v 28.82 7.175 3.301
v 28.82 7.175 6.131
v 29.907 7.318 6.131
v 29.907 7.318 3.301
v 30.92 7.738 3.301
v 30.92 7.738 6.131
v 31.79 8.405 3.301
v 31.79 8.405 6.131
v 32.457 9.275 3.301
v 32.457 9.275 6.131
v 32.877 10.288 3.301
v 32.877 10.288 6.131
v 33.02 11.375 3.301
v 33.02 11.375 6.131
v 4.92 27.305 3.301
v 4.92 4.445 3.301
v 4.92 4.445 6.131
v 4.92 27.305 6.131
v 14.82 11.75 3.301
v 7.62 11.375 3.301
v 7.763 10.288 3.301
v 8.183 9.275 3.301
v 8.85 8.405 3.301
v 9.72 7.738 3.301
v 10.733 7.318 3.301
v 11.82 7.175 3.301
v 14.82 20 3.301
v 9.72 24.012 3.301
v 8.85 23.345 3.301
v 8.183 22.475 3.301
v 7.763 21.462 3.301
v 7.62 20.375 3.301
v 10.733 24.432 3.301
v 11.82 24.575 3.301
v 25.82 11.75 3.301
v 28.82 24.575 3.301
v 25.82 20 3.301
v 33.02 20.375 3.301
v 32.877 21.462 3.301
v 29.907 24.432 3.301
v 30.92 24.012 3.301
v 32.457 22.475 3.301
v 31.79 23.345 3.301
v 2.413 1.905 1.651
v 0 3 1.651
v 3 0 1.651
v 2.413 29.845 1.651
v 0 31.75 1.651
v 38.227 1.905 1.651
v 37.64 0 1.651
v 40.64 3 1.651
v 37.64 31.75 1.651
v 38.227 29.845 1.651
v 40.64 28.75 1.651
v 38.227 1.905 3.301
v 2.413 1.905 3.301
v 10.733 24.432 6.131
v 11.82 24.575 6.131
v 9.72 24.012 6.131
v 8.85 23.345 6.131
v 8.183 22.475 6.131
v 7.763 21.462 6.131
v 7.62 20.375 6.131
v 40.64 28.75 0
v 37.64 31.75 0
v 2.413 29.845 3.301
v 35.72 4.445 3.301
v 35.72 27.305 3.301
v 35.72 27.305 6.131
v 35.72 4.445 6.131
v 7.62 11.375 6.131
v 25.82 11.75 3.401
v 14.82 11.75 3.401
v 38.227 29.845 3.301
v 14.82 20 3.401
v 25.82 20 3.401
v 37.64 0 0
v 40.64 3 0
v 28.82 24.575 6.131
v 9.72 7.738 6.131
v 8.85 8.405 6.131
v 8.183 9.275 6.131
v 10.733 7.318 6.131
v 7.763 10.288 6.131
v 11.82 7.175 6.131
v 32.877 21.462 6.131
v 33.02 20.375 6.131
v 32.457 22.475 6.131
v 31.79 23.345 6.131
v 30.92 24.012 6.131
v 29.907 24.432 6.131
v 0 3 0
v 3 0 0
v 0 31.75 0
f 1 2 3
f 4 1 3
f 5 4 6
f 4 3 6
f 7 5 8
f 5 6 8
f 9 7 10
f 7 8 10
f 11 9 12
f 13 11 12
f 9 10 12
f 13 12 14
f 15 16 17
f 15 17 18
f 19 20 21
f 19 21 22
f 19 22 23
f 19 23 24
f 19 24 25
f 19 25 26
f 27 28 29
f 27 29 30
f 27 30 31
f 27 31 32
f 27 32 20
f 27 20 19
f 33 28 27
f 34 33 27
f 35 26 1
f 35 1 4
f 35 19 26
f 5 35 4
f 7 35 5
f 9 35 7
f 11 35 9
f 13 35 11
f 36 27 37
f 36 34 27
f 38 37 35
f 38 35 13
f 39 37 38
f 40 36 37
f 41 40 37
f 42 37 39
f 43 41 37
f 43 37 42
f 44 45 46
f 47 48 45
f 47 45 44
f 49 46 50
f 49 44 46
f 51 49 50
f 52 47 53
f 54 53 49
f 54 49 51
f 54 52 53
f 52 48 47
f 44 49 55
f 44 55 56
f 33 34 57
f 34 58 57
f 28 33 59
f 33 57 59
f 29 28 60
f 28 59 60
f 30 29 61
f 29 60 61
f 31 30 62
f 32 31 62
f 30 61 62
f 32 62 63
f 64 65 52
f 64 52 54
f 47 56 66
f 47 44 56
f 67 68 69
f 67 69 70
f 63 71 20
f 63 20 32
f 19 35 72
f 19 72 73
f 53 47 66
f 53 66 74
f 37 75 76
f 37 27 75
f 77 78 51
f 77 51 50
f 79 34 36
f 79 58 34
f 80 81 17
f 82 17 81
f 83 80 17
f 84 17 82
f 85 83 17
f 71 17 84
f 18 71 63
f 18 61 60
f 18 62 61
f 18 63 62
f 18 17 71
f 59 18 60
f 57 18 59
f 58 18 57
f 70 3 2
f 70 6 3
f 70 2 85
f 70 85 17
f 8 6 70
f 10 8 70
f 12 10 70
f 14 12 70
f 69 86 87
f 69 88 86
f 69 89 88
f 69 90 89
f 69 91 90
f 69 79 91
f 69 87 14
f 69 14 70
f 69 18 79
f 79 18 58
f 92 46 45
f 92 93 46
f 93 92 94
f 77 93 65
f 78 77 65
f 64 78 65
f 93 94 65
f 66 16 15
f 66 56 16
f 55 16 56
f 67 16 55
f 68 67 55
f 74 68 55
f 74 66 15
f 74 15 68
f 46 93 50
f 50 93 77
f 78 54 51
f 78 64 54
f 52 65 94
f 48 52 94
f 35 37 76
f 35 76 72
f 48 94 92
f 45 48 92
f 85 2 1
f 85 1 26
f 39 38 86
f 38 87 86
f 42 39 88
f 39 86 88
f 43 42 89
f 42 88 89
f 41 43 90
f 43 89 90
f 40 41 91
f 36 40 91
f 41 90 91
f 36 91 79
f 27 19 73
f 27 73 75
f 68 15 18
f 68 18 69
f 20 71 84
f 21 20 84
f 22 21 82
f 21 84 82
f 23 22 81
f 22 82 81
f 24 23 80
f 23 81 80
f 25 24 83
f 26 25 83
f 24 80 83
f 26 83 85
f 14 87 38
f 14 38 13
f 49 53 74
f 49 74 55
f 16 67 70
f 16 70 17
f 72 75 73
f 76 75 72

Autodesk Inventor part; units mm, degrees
ref_plane "YZ Plane" through (0, 0, 0) normal (1, 0, 0) x (0, 1, 0)
ref_plane "XZ Plane" through (0, 0, 0) normal (0, 1, 0) x (-1, 0, 0)
ref_plane "XY Plane" through (0, 0, 0) normal (0, 0, 1) x (1, 0, 0)
sketch "Sketch1" plane through (0, 0, 0) normal (0, 0, 1) x (1, 0, 0)
  line L0 (3, 0) -> (40.64, 0)
  line L1 (37.64, 31.75) -> (0, 31.75)
  line L2 (0, 31.75) -> (0, 3)
  line L3 (37.64, 31.75) -> (40.64, 28.75)
  line L4 (3, 0) -> (0, 3)
  line L5 (40.64, 3) -> (37.64, 0)
  line L6 (40.64, 28.75) -> (40.64, 3)
  point P0 (0, 0)
  dimension "d4" = 3
  dimension "d5" = 45
  dimension "d6" = 45
  dimension "d7" = 3
  dimension "d8" = 31.75
  dimension "d9" = 40.64
  dimension "d10" = 3
extrude "Extrusion1" add sketch "Sketch1" along normal blind 1.651
sketch "Sketch2" plane through (0, 0, 1.651) normal (0, 0, 1) x (1, 0, 0)
  line L0 (2.413, 29.845) -> (38.227, 29.845)
  line L1 (38.227, 29.845) -> (38.227, 1.905)
  line L2 (38.227, 1.905) -> (2.413, 1.905)
  line L3 (2.413, 1.905) -> (2.413, 29.845)
  line L4 (0, 31.75) -> (0, 3) projected
  line L5 (3, 0) -> (37.64, 0) projected
  line L6 (40.64, 3) -> (40.64, 28.75) projected
  point P0 (0, 0)
  point P1 (0, 17.375)
  point P2 (20.32, 1.905)
  point P3 (20.32, 0)
  point P4 (38.227, 15.875)
  point P5 (40.64, 15.875)
  dimension "d13" = 27.94
  dimension "d14" = 35.814
extrude "Extrusion2" add sketch "Sketch2" along normal blind 1.65
sketch "Sketch3" plane through (0, 0, 3.301) normal (0, 0, 1) x (1, 0, 0)
  line L0 (4.92, 27.305) -> (35.72, 27.305)
  line L1 (35.72, 27.305) -> (35.72, 4.445)
  line L2 (35.72, 4.445) -> (4.92, 4.445)
  line L3 (4.92, 4.445) -> (4.92, 27.305)
  line L4 (2.413, 29.845) -> (2.413, 1.905) projected
  line L5 (3, 0) -> (37.64, 0) projected
  point P0 (0, 0)
  point P1 (4.92, 15.875)
  point P2 (2.413, 15.875)
  point P3 (20.32, 4.445)
  point P4 (20.32, 0)
  dimension "d17" = 22.86
  dimension "d18" = 30.8
extrude "Extrusion3" add sketch "Sketch3" along normal blind 2.83
sketch "Sketch4" plane through (0, 0, 6.131) normal (0, 0, 1) x (1, 0, 0)
  line L0 (11.82, 24.575) -> (28.82, 24.575)
  line L1 (33.02, 20.375) -> (33.02, 11.375)
  line L2 (28.82, 7.175) -> (11.82, 7.175)
  line L3 (7.62, 11.375) -> (7.62, 20.375)
  line L4 (4.92, 27.305) -> (4.92, 4.445) projected
  line L5 (2.413, 1.905) -> (38.227, 1.905) projected
  arc A0 (7.62, 11.375) -> (11.82, 7.175) centre (11.82, 11.375) ccw
  arc A1 (11.82, 24.575) -> (7.62, 20.375) centre (11.82, 20.375) ccw
  arc A2 (33.02, 20.375) -> (28.82, 24.575) centre (28.82, 20.375) ccw
  arc A3 (28.82, 7.175) -> (33.02, 11.375) centre (28.82, 11.375) ccw
  point P0 (0, 0)
  point P1 (7.62, 24.575)
  point P2 (33.02, 7.175)
  point P3 (7.62, 7.175)
  point P4 (7.62, 15.875)
  point P5 (4.92, 15.875)
  point P6 (20.32, 7.175)
  point P7 (20.32, 1.905)
  dimension "d21" = 17.4
  dimension "d22" = 25.4
  dimension "d23" = 4.2
extrude "Extrusion4" cut sketch "Sketch4" against normal blind 2.83
sketch "Sketch5" plane through (0, 0, 3.301) normal (0, 0, 1) x (1, 0, 0)
  line L0 (25.82, 11.75) -> (14.82, 11.75)
  line L1 (14.82, 11.75) -> (14.82, 20)
  line L2 (14.82, 20) -> (25.82, 20)
  line L3 (25.82, 20) -> (25.82, 11.75)
  line L4 (7.62, 11.375) -> (7.62, 20.375) projected
  line L5 (28.82, 7.175) -> (11.82, 7.175) projected
  point P0 (0, 0)
  point P1 (14.82, 15.875)
  point P2 (7.62, 15.875)
  point P3 (20.32, 11.75)
  point P4 (20.32, 7.175)
  dimension "d26" = 11
  dimension "d27" = 8.25
extrude "Extrusion5" add sketch "Sketch5" along normal blind 0.1
properties part number "DLP"
